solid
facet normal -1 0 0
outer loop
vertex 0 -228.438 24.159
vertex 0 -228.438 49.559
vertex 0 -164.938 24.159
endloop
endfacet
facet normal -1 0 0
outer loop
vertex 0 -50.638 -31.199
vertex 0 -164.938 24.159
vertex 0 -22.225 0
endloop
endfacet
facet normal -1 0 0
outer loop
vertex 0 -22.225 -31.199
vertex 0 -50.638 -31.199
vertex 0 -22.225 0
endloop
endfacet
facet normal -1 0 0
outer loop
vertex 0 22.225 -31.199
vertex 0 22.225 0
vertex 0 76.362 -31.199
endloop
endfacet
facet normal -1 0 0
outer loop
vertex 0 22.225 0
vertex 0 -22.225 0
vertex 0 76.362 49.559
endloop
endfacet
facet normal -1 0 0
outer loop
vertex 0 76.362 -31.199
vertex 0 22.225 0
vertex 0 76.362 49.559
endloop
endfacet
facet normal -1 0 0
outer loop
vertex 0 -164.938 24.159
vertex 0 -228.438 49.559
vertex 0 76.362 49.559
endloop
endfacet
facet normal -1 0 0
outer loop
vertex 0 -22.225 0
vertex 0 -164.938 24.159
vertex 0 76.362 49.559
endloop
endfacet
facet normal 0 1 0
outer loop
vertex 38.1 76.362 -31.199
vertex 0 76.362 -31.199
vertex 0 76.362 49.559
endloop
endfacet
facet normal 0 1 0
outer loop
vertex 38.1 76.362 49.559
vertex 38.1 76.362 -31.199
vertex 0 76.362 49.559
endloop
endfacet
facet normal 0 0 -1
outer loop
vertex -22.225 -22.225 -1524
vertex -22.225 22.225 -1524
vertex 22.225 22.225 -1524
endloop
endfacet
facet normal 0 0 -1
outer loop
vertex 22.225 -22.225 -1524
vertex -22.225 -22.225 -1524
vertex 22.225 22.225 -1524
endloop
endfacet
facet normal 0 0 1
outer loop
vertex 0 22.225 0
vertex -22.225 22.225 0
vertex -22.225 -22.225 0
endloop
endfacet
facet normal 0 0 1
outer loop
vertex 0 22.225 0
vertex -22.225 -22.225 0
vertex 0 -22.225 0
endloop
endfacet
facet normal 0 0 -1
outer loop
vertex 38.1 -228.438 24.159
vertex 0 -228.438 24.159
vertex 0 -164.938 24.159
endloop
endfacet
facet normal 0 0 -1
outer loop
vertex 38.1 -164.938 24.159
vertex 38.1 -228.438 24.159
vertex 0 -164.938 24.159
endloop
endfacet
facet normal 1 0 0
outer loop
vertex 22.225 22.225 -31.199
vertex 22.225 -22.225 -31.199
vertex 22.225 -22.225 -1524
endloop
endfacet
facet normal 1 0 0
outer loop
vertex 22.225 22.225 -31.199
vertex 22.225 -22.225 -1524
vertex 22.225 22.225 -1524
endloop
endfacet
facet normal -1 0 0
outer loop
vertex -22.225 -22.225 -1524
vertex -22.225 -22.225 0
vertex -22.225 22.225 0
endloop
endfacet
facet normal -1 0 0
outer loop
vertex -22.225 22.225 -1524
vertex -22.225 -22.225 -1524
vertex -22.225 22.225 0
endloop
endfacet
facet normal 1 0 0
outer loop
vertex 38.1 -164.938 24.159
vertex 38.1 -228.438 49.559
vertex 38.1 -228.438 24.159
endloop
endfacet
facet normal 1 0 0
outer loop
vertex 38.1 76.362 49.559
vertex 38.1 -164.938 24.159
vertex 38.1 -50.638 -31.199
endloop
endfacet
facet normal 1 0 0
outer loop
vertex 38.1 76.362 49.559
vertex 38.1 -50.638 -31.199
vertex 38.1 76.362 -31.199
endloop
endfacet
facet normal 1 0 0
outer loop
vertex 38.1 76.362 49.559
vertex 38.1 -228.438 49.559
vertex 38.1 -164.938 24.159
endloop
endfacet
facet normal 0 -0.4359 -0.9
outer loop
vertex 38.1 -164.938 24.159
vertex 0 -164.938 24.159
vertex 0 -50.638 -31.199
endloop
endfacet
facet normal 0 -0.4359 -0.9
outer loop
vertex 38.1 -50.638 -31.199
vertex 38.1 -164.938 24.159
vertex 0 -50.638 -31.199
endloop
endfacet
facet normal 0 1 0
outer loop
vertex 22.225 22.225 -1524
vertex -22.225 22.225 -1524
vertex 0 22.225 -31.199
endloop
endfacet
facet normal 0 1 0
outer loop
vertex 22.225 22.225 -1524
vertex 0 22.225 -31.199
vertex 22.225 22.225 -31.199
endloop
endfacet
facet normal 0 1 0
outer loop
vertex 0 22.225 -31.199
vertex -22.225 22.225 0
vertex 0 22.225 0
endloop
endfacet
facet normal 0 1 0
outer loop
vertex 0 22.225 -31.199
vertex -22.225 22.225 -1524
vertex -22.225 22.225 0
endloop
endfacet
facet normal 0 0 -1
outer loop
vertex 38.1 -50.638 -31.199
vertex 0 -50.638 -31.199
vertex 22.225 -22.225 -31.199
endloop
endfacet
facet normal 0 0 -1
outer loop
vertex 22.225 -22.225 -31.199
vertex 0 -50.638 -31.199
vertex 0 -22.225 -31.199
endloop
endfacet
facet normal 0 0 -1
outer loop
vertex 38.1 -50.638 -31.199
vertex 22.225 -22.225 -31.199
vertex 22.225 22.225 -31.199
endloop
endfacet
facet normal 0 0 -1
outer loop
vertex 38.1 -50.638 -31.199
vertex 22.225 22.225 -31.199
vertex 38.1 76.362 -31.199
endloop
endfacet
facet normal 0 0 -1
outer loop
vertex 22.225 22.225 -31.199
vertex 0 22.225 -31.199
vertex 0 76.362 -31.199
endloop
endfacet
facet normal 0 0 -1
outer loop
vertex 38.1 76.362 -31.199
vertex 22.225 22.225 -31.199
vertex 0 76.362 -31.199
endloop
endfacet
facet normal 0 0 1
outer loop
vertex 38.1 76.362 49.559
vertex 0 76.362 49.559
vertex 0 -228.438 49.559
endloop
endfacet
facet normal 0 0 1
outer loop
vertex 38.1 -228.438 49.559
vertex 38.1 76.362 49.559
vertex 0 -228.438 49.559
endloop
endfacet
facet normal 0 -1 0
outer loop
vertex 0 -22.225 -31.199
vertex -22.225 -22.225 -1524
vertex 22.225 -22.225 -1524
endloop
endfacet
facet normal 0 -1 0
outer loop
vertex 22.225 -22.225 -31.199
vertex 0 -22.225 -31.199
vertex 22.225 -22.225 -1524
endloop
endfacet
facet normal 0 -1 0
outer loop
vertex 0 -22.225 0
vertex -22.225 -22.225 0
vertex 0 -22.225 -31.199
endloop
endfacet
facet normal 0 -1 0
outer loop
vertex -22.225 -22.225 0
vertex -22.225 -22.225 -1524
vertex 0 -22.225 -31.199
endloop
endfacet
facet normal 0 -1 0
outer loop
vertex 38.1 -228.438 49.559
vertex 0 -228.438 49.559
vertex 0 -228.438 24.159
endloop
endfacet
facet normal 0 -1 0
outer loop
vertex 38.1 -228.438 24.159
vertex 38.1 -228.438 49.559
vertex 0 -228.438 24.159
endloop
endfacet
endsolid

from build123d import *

# Parameters (mm, degrees)
F0_W     = 44.45
F0_H     = 44.45
F1_DEPTH = 1524
F3_DEPTH = 38.1


with BuildPart() as f1:
    # F0 (on Top) → F1 (new body)
    with BuildSketch(Plane.XY):
        Rectangle(F0_W, F0_H)
    extrude(amount=-F1_DEPTH)

    # F2 (on Right) → F3 (join)
    with BuildSketch(Plane.YZ):
        Polygon((76.361727, -31.198649), (76.361727, 49.559367), (-228.438273, 49.559367), (-228.438273, 24.159367), (-164.938273, 24.159367), (-50.638273, -31.198649), align=None)
    extrude(amount=F3_DEPTH)


solid = f1.part
